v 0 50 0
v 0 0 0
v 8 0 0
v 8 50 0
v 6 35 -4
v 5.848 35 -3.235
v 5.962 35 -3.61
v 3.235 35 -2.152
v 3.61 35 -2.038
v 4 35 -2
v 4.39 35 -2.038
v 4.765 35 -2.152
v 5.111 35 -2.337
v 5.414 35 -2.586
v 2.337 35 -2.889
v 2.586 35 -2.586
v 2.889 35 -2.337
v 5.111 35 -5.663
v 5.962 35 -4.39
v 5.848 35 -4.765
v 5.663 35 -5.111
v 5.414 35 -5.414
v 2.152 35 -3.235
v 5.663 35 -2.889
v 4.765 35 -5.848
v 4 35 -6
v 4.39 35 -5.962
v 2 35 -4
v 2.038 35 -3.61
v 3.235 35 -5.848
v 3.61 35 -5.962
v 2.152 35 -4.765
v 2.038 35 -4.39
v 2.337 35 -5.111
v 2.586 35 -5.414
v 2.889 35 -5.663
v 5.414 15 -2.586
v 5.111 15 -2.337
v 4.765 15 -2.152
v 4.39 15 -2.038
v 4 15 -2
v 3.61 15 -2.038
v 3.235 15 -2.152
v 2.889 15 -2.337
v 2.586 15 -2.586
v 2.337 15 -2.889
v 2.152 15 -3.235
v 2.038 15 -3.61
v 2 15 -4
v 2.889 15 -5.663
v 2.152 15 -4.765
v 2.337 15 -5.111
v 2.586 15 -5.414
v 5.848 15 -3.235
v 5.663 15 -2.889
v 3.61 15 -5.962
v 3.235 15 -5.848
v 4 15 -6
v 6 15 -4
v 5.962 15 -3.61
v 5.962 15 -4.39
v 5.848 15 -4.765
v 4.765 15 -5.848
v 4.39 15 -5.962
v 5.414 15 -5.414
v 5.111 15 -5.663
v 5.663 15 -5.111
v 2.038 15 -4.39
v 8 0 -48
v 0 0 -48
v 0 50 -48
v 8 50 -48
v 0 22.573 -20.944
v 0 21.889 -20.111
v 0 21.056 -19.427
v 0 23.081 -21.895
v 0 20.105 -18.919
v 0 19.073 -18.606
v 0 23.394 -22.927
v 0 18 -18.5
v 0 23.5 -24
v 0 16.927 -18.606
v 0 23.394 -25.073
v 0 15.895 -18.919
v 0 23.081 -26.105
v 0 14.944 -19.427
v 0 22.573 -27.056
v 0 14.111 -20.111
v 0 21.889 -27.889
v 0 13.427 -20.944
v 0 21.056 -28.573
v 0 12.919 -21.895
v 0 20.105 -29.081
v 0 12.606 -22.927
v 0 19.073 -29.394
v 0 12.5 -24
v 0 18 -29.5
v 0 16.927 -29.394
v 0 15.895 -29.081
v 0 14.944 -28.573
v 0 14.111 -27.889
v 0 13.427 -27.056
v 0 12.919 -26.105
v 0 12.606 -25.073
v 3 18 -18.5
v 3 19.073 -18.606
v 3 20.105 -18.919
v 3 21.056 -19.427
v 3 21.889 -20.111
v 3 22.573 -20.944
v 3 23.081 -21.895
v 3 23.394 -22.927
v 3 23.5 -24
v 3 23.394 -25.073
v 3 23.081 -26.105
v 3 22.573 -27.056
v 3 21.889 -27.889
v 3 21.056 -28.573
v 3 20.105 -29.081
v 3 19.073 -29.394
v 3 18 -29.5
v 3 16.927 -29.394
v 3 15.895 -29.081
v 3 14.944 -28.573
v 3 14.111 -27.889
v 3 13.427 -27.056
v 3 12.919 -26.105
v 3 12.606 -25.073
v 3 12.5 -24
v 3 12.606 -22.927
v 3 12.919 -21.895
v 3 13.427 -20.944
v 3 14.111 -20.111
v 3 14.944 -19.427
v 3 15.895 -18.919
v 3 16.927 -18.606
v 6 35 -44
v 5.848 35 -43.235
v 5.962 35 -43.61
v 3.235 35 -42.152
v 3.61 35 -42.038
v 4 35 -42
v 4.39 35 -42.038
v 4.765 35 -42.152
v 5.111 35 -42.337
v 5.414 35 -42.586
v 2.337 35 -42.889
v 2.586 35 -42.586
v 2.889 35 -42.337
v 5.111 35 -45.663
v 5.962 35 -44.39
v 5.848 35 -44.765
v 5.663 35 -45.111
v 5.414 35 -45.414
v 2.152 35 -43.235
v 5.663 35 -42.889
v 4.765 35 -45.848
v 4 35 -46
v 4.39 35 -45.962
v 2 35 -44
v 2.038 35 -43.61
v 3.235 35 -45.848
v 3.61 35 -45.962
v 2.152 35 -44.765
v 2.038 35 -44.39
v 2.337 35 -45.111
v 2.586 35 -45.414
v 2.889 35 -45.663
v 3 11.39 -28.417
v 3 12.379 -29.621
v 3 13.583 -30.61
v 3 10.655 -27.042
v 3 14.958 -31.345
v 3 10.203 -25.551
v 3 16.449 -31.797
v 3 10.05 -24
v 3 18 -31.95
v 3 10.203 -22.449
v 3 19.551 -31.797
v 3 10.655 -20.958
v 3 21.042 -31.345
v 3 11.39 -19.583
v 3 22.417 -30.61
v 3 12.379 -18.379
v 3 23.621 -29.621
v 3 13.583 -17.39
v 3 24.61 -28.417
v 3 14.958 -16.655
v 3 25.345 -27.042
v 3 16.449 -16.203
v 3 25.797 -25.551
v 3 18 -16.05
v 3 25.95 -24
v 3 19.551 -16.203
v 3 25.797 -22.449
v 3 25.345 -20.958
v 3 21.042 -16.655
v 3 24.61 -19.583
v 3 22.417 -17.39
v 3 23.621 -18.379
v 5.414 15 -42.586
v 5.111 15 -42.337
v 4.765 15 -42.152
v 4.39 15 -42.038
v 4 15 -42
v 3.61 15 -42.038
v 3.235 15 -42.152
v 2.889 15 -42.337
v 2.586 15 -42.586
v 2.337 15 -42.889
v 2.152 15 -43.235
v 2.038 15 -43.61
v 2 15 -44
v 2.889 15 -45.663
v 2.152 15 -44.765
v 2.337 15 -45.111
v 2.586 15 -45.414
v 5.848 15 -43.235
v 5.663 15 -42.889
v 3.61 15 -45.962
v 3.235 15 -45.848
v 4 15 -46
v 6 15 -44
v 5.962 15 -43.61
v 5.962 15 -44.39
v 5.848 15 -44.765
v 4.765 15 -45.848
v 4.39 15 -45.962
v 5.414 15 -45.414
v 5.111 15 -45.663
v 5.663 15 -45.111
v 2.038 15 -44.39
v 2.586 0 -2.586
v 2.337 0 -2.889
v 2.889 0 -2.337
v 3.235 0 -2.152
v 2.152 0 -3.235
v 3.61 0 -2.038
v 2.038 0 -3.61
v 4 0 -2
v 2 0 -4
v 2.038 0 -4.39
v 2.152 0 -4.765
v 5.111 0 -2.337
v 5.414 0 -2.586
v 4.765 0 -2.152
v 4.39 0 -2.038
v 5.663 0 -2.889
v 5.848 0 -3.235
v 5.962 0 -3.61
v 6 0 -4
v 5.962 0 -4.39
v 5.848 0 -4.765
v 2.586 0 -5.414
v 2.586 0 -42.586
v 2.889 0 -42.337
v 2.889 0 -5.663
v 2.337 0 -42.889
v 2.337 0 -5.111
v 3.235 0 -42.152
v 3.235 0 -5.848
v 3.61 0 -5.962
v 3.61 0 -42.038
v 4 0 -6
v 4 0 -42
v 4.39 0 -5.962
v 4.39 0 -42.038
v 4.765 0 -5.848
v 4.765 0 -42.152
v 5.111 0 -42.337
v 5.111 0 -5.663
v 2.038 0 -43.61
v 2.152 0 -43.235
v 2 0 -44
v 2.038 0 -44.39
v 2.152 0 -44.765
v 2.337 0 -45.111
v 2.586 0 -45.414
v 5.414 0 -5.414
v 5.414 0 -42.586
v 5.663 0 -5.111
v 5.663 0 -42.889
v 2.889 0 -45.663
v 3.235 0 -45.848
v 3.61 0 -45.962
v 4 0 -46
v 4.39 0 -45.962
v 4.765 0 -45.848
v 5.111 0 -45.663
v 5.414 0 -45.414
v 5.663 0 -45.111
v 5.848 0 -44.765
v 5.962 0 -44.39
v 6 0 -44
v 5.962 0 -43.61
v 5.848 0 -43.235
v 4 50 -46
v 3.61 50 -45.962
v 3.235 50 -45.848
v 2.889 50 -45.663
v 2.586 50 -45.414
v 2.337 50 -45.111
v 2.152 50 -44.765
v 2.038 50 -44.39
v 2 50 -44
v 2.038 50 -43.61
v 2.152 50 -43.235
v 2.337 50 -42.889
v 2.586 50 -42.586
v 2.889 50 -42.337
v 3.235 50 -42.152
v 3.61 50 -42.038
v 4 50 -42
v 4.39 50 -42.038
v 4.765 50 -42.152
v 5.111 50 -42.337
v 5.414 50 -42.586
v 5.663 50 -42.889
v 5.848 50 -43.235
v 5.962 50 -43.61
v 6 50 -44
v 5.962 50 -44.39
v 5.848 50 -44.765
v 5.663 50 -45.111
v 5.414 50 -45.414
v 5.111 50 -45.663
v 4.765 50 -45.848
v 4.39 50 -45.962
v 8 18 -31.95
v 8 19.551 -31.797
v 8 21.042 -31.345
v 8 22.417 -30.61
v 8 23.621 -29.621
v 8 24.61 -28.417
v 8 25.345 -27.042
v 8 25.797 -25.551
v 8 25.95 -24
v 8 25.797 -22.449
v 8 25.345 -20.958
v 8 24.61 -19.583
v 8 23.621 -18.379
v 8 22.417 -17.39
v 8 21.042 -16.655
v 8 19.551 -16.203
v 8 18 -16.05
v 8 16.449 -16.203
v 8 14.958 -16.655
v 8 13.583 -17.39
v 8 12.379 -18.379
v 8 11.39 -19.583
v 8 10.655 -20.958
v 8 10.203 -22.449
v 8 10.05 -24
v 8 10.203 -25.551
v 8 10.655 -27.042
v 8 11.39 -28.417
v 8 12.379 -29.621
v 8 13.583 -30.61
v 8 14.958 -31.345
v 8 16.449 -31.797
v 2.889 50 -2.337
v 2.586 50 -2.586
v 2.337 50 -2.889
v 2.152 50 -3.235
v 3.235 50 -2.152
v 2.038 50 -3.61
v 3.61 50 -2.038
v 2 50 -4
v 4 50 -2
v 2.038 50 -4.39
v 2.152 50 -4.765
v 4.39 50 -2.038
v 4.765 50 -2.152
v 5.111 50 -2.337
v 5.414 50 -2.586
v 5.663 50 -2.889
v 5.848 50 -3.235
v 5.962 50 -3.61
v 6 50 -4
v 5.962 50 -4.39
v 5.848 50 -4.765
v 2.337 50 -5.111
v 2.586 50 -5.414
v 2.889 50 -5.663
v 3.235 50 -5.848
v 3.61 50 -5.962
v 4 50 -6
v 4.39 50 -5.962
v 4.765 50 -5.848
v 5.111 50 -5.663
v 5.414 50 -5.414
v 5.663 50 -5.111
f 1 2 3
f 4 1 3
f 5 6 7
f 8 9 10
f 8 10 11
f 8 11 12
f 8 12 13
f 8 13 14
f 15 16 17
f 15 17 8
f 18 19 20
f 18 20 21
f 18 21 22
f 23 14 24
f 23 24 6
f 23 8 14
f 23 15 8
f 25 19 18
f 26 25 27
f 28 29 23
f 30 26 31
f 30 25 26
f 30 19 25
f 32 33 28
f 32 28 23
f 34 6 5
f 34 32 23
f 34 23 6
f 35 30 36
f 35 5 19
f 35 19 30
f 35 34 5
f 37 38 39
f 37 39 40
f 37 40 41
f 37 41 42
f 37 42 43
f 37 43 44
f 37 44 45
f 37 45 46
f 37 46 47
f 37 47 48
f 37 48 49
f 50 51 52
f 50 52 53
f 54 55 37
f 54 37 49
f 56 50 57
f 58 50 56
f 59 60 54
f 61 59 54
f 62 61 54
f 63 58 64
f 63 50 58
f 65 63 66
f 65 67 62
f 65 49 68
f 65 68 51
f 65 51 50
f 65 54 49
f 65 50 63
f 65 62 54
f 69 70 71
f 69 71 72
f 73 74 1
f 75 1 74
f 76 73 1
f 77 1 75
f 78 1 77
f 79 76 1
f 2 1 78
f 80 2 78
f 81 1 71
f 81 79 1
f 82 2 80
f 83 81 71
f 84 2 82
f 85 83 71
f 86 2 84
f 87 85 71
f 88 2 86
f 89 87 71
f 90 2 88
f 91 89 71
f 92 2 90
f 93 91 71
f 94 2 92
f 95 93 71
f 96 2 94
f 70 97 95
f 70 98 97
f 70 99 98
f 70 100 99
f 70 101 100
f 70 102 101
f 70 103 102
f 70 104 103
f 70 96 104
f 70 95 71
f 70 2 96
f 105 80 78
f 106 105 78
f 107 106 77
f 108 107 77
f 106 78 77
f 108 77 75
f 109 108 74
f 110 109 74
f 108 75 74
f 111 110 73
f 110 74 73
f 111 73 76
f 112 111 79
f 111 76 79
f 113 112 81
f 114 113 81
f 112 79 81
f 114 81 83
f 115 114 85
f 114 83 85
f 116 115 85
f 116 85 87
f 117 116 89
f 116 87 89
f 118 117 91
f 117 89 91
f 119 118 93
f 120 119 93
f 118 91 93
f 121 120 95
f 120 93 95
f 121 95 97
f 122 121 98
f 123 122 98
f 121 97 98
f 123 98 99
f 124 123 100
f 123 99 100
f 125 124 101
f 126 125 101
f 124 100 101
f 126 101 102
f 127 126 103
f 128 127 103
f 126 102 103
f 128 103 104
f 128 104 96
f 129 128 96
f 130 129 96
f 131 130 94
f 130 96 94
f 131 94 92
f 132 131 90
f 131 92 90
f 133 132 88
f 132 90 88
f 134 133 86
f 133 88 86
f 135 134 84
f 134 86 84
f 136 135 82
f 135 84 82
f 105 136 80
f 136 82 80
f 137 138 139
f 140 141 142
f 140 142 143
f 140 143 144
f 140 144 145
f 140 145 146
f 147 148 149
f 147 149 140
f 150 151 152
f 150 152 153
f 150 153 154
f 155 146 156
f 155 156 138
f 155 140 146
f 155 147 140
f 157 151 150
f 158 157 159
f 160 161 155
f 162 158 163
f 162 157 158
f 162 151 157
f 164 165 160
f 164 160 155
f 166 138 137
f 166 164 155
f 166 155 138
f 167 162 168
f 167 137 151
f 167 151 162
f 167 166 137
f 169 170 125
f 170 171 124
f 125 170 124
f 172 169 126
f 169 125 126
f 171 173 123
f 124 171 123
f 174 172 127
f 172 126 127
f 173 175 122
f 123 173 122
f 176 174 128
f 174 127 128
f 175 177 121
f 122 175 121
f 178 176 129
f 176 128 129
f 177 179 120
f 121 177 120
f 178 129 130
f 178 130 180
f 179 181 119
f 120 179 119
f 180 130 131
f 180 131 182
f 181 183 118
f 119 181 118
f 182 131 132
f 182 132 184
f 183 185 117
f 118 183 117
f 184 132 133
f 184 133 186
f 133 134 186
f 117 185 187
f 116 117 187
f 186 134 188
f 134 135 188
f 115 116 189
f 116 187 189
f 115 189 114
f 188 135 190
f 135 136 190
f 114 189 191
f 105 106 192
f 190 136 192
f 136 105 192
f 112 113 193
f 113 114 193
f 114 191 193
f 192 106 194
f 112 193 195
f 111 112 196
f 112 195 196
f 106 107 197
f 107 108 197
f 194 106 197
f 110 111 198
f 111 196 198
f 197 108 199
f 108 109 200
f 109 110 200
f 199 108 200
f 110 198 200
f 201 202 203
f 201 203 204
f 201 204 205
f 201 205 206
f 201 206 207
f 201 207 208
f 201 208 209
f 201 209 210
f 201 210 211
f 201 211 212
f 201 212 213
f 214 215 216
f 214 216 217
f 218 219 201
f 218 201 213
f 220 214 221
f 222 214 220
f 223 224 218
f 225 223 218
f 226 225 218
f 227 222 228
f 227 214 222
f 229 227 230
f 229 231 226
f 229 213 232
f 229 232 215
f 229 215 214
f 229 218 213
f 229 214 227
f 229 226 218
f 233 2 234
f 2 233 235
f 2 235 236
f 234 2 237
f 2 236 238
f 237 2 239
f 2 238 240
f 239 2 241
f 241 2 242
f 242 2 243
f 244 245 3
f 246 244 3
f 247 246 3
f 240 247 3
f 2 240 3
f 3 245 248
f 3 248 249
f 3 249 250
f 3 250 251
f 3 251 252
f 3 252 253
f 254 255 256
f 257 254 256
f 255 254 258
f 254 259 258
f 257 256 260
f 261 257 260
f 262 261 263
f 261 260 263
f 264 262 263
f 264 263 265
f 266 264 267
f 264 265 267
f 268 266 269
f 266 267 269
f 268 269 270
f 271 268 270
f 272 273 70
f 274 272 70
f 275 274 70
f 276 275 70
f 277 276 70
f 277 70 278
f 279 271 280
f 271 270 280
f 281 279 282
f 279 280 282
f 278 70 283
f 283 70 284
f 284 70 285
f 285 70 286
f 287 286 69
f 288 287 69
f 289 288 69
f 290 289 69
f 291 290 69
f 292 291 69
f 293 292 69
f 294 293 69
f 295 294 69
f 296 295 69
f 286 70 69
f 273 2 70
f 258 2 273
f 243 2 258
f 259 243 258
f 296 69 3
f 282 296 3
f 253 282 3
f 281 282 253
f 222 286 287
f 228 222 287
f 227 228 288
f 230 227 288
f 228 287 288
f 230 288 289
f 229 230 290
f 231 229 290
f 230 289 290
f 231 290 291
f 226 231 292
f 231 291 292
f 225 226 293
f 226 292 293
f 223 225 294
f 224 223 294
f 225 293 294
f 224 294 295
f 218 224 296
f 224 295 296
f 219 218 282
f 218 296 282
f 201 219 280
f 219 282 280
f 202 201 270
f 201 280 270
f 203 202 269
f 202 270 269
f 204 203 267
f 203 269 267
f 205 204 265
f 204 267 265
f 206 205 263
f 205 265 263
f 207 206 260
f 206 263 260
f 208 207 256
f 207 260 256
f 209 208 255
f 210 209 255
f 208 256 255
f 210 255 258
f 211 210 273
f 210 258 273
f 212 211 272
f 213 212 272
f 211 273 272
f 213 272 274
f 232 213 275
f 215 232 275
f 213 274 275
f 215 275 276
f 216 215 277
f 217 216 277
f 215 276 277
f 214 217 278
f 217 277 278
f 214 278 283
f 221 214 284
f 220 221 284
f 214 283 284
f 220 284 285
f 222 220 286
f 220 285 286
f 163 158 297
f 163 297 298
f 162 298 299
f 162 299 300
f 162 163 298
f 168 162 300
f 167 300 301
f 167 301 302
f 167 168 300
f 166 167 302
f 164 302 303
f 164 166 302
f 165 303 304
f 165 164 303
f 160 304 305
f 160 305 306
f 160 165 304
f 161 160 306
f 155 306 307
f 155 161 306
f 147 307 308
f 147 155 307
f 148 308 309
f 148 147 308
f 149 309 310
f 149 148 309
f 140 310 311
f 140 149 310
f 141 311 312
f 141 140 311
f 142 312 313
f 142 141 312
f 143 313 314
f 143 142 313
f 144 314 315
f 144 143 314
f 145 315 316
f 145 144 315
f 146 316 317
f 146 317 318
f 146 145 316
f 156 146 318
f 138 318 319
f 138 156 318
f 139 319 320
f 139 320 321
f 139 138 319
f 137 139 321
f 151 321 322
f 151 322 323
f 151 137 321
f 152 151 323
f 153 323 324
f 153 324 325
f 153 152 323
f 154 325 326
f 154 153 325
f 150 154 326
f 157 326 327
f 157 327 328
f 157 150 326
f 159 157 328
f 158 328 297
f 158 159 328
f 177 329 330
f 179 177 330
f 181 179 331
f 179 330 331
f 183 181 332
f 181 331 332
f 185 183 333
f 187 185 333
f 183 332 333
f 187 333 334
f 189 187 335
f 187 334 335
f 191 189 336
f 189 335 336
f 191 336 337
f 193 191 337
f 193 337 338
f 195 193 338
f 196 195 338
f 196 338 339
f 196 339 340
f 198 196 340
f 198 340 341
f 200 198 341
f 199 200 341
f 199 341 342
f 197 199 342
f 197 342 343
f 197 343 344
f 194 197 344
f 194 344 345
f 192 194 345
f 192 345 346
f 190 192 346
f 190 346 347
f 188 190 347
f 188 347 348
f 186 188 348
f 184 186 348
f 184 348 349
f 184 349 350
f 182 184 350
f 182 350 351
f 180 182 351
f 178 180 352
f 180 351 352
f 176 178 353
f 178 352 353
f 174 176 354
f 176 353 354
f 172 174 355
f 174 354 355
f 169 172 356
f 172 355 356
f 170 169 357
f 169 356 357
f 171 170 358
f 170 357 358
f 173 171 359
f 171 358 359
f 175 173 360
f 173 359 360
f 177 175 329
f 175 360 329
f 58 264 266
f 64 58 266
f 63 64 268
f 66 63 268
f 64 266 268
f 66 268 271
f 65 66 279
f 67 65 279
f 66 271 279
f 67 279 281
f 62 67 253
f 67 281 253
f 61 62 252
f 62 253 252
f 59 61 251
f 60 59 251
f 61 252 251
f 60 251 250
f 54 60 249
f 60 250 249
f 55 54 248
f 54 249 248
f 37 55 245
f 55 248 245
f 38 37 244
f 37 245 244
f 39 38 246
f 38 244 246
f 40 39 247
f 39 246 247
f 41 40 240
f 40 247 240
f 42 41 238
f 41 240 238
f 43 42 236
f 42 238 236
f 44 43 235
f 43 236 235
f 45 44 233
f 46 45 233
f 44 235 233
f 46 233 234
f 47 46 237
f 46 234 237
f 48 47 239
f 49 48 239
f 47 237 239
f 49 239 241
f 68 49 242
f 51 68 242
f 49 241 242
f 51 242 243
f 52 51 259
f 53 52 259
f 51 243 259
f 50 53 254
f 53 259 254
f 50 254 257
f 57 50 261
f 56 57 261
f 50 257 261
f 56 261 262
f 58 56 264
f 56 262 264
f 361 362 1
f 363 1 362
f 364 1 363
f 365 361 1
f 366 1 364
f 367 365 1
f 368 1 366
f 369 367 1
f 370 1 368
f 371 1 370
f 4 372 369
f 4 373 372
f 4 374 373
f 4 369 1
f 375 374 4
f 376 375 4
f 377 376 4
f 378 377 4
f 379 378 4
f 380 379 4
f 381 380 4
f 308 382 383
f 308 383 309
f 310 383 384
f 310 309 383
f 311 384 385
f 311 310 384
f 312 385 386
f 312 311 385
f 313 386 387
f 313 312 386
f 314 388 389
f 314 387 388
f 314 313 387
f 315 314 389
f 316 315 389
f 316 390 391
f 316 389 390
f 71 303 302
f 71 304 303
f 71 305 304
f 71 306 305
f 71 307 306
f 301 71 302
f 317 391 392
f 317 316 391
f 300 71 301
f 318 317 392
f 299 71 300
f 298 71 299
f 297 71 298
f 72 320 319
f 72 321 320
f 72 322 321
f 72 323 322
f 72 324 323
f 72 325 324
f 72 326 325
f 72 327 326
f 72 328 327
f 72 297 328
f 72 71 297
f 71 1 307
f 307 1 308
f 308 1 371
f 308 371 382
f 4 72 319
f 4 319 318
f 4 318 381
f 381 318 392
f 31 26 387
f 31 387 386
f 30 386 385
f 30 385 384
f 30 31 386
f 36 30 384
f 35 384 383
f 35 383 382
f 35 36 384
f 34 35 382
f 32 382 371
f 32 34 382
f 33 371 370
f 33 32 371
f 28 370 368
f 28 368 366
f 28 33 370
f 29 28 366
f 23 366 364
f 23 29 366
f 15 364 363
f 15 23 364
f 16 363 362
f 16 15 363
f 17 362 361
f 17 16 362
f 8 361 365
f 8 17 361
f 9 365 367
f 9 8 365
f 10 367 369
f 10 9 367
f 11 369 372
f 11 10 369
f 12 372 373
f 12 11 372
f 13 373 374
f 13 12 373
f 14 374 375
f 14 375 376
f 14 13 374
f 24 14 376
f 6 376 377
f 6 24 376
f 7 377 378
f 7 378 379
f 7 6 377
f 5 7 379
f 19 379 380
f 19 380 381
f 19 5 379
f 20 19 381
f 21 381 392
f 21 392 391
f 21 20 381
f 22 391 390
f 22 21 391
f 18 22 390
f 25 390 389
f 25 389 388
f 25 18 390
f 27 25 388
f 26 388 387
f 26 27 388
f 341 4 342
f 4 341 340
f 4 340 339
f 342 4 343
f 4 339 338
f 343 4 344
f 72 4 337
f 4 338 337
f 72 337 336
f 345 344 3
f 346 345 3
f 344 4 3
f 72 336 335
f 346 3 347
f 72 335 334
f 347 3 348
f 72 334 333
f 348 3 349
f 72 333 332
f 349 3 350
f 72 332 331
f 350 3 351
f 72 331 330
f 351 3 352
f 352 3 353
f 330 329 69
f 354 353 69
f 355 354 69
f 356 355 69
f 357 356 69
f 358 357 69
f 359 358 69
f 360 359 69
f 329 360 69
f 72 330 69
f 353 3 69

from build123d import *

# Parameters (mm, degrees)
ESQUISSE1_W             = 8
ESQUISSE1_H             = 48
BOSS_EXTRU_1_DEPTH      = 50
ESQUISSE28_R            = 7.95
ENL_V_MAT_EXTRU_1_DEPTH = 10
ESQUISSE29_R            = 8.2
ESQUISSE29_R_2          = 5.5
BOSS_EXTRU_2_DEPTH      = 3
ESQUISSE30_R            = 2
ENL_V_MAT_EXTRU_2_DEPTH = 15
ENL_V_START             = -15
ESQUISSE31_R            = 2
ENL_V_MAT_EXTRU_3_DEPTH = 15


with BuildPart() as part:
    # Esquisse1 → Boss.-Extru.1 (new body)
    with BuildSketch(Plane(origin=(0, 0, 0), x_dir=(1, 0, 0), z_dir=(0, 1, 0))):
        with Locations((4, 24)):
            Rectangle(ESQUISSE1_W, ESQUISSE1_H)
    extrude(amount=BOSS_EXTRU_1_DEPTH)

    # Esquisse28 → Enlèv. mat.-Extru.1 (cut)
    with BuildSketch(Plane(origin=(8, 0, 0), x_dir=(0, 0, -1), z_dir=(1, 0, 0))):
        with Locations((24, 18)):
            Circle(ESQUISSE28_R)
    extrude(amount=-ENL_V_MAT_EXTRU_1_DEPTH, mode=Mode.SUBTRACT)

    # Esquisse29 → Boss.-Extru.2 (add)
    with BuildSketch(Plane.ZY):
        with Locations((-24, 18)):
            Circle(ESQUISSE29_R)
        with Locations((-24, 18)):
            Circle(ESQUISSE29_R_2, mode=Mode.SUBTRACT)
    extrude(amount=-BOSS_EXTRU_2_DEPTH)

    # Esquisse30 → Enlèv. mat.-Extru.2 (cut)
    with BuildSketch(Plane.XZ):
        with Locations((4, -44)):
            Circle(ESQUISSE30_R)
        with Locations((4, -4)):
            Circle(ESQUISSE30_R)
    extrude(amount=-ENL_V_MAT_EXTRU_2_DEPTH, mode=Mode.SUBTRACT)

    # Esquisse31 → Enlèv. mat.-Extru.3 (cut)
    with BuildSketch(Plane(origin=(0, 50, 0), x_dir=(1, 0, 0), z_dir=(0, 1, 0)).offset(ENL_V_START)):
        with Locations((4, 44)):
            Circle(ESQUISSE31_R)
        with Locations((4, 4)):
            Circle(ESQUISSE31_R)
    extrude(amount=ENL_V_MAT_EXTRU_3_DEPTH, mode=Mode.SUBTRACT)


solid = part.part
